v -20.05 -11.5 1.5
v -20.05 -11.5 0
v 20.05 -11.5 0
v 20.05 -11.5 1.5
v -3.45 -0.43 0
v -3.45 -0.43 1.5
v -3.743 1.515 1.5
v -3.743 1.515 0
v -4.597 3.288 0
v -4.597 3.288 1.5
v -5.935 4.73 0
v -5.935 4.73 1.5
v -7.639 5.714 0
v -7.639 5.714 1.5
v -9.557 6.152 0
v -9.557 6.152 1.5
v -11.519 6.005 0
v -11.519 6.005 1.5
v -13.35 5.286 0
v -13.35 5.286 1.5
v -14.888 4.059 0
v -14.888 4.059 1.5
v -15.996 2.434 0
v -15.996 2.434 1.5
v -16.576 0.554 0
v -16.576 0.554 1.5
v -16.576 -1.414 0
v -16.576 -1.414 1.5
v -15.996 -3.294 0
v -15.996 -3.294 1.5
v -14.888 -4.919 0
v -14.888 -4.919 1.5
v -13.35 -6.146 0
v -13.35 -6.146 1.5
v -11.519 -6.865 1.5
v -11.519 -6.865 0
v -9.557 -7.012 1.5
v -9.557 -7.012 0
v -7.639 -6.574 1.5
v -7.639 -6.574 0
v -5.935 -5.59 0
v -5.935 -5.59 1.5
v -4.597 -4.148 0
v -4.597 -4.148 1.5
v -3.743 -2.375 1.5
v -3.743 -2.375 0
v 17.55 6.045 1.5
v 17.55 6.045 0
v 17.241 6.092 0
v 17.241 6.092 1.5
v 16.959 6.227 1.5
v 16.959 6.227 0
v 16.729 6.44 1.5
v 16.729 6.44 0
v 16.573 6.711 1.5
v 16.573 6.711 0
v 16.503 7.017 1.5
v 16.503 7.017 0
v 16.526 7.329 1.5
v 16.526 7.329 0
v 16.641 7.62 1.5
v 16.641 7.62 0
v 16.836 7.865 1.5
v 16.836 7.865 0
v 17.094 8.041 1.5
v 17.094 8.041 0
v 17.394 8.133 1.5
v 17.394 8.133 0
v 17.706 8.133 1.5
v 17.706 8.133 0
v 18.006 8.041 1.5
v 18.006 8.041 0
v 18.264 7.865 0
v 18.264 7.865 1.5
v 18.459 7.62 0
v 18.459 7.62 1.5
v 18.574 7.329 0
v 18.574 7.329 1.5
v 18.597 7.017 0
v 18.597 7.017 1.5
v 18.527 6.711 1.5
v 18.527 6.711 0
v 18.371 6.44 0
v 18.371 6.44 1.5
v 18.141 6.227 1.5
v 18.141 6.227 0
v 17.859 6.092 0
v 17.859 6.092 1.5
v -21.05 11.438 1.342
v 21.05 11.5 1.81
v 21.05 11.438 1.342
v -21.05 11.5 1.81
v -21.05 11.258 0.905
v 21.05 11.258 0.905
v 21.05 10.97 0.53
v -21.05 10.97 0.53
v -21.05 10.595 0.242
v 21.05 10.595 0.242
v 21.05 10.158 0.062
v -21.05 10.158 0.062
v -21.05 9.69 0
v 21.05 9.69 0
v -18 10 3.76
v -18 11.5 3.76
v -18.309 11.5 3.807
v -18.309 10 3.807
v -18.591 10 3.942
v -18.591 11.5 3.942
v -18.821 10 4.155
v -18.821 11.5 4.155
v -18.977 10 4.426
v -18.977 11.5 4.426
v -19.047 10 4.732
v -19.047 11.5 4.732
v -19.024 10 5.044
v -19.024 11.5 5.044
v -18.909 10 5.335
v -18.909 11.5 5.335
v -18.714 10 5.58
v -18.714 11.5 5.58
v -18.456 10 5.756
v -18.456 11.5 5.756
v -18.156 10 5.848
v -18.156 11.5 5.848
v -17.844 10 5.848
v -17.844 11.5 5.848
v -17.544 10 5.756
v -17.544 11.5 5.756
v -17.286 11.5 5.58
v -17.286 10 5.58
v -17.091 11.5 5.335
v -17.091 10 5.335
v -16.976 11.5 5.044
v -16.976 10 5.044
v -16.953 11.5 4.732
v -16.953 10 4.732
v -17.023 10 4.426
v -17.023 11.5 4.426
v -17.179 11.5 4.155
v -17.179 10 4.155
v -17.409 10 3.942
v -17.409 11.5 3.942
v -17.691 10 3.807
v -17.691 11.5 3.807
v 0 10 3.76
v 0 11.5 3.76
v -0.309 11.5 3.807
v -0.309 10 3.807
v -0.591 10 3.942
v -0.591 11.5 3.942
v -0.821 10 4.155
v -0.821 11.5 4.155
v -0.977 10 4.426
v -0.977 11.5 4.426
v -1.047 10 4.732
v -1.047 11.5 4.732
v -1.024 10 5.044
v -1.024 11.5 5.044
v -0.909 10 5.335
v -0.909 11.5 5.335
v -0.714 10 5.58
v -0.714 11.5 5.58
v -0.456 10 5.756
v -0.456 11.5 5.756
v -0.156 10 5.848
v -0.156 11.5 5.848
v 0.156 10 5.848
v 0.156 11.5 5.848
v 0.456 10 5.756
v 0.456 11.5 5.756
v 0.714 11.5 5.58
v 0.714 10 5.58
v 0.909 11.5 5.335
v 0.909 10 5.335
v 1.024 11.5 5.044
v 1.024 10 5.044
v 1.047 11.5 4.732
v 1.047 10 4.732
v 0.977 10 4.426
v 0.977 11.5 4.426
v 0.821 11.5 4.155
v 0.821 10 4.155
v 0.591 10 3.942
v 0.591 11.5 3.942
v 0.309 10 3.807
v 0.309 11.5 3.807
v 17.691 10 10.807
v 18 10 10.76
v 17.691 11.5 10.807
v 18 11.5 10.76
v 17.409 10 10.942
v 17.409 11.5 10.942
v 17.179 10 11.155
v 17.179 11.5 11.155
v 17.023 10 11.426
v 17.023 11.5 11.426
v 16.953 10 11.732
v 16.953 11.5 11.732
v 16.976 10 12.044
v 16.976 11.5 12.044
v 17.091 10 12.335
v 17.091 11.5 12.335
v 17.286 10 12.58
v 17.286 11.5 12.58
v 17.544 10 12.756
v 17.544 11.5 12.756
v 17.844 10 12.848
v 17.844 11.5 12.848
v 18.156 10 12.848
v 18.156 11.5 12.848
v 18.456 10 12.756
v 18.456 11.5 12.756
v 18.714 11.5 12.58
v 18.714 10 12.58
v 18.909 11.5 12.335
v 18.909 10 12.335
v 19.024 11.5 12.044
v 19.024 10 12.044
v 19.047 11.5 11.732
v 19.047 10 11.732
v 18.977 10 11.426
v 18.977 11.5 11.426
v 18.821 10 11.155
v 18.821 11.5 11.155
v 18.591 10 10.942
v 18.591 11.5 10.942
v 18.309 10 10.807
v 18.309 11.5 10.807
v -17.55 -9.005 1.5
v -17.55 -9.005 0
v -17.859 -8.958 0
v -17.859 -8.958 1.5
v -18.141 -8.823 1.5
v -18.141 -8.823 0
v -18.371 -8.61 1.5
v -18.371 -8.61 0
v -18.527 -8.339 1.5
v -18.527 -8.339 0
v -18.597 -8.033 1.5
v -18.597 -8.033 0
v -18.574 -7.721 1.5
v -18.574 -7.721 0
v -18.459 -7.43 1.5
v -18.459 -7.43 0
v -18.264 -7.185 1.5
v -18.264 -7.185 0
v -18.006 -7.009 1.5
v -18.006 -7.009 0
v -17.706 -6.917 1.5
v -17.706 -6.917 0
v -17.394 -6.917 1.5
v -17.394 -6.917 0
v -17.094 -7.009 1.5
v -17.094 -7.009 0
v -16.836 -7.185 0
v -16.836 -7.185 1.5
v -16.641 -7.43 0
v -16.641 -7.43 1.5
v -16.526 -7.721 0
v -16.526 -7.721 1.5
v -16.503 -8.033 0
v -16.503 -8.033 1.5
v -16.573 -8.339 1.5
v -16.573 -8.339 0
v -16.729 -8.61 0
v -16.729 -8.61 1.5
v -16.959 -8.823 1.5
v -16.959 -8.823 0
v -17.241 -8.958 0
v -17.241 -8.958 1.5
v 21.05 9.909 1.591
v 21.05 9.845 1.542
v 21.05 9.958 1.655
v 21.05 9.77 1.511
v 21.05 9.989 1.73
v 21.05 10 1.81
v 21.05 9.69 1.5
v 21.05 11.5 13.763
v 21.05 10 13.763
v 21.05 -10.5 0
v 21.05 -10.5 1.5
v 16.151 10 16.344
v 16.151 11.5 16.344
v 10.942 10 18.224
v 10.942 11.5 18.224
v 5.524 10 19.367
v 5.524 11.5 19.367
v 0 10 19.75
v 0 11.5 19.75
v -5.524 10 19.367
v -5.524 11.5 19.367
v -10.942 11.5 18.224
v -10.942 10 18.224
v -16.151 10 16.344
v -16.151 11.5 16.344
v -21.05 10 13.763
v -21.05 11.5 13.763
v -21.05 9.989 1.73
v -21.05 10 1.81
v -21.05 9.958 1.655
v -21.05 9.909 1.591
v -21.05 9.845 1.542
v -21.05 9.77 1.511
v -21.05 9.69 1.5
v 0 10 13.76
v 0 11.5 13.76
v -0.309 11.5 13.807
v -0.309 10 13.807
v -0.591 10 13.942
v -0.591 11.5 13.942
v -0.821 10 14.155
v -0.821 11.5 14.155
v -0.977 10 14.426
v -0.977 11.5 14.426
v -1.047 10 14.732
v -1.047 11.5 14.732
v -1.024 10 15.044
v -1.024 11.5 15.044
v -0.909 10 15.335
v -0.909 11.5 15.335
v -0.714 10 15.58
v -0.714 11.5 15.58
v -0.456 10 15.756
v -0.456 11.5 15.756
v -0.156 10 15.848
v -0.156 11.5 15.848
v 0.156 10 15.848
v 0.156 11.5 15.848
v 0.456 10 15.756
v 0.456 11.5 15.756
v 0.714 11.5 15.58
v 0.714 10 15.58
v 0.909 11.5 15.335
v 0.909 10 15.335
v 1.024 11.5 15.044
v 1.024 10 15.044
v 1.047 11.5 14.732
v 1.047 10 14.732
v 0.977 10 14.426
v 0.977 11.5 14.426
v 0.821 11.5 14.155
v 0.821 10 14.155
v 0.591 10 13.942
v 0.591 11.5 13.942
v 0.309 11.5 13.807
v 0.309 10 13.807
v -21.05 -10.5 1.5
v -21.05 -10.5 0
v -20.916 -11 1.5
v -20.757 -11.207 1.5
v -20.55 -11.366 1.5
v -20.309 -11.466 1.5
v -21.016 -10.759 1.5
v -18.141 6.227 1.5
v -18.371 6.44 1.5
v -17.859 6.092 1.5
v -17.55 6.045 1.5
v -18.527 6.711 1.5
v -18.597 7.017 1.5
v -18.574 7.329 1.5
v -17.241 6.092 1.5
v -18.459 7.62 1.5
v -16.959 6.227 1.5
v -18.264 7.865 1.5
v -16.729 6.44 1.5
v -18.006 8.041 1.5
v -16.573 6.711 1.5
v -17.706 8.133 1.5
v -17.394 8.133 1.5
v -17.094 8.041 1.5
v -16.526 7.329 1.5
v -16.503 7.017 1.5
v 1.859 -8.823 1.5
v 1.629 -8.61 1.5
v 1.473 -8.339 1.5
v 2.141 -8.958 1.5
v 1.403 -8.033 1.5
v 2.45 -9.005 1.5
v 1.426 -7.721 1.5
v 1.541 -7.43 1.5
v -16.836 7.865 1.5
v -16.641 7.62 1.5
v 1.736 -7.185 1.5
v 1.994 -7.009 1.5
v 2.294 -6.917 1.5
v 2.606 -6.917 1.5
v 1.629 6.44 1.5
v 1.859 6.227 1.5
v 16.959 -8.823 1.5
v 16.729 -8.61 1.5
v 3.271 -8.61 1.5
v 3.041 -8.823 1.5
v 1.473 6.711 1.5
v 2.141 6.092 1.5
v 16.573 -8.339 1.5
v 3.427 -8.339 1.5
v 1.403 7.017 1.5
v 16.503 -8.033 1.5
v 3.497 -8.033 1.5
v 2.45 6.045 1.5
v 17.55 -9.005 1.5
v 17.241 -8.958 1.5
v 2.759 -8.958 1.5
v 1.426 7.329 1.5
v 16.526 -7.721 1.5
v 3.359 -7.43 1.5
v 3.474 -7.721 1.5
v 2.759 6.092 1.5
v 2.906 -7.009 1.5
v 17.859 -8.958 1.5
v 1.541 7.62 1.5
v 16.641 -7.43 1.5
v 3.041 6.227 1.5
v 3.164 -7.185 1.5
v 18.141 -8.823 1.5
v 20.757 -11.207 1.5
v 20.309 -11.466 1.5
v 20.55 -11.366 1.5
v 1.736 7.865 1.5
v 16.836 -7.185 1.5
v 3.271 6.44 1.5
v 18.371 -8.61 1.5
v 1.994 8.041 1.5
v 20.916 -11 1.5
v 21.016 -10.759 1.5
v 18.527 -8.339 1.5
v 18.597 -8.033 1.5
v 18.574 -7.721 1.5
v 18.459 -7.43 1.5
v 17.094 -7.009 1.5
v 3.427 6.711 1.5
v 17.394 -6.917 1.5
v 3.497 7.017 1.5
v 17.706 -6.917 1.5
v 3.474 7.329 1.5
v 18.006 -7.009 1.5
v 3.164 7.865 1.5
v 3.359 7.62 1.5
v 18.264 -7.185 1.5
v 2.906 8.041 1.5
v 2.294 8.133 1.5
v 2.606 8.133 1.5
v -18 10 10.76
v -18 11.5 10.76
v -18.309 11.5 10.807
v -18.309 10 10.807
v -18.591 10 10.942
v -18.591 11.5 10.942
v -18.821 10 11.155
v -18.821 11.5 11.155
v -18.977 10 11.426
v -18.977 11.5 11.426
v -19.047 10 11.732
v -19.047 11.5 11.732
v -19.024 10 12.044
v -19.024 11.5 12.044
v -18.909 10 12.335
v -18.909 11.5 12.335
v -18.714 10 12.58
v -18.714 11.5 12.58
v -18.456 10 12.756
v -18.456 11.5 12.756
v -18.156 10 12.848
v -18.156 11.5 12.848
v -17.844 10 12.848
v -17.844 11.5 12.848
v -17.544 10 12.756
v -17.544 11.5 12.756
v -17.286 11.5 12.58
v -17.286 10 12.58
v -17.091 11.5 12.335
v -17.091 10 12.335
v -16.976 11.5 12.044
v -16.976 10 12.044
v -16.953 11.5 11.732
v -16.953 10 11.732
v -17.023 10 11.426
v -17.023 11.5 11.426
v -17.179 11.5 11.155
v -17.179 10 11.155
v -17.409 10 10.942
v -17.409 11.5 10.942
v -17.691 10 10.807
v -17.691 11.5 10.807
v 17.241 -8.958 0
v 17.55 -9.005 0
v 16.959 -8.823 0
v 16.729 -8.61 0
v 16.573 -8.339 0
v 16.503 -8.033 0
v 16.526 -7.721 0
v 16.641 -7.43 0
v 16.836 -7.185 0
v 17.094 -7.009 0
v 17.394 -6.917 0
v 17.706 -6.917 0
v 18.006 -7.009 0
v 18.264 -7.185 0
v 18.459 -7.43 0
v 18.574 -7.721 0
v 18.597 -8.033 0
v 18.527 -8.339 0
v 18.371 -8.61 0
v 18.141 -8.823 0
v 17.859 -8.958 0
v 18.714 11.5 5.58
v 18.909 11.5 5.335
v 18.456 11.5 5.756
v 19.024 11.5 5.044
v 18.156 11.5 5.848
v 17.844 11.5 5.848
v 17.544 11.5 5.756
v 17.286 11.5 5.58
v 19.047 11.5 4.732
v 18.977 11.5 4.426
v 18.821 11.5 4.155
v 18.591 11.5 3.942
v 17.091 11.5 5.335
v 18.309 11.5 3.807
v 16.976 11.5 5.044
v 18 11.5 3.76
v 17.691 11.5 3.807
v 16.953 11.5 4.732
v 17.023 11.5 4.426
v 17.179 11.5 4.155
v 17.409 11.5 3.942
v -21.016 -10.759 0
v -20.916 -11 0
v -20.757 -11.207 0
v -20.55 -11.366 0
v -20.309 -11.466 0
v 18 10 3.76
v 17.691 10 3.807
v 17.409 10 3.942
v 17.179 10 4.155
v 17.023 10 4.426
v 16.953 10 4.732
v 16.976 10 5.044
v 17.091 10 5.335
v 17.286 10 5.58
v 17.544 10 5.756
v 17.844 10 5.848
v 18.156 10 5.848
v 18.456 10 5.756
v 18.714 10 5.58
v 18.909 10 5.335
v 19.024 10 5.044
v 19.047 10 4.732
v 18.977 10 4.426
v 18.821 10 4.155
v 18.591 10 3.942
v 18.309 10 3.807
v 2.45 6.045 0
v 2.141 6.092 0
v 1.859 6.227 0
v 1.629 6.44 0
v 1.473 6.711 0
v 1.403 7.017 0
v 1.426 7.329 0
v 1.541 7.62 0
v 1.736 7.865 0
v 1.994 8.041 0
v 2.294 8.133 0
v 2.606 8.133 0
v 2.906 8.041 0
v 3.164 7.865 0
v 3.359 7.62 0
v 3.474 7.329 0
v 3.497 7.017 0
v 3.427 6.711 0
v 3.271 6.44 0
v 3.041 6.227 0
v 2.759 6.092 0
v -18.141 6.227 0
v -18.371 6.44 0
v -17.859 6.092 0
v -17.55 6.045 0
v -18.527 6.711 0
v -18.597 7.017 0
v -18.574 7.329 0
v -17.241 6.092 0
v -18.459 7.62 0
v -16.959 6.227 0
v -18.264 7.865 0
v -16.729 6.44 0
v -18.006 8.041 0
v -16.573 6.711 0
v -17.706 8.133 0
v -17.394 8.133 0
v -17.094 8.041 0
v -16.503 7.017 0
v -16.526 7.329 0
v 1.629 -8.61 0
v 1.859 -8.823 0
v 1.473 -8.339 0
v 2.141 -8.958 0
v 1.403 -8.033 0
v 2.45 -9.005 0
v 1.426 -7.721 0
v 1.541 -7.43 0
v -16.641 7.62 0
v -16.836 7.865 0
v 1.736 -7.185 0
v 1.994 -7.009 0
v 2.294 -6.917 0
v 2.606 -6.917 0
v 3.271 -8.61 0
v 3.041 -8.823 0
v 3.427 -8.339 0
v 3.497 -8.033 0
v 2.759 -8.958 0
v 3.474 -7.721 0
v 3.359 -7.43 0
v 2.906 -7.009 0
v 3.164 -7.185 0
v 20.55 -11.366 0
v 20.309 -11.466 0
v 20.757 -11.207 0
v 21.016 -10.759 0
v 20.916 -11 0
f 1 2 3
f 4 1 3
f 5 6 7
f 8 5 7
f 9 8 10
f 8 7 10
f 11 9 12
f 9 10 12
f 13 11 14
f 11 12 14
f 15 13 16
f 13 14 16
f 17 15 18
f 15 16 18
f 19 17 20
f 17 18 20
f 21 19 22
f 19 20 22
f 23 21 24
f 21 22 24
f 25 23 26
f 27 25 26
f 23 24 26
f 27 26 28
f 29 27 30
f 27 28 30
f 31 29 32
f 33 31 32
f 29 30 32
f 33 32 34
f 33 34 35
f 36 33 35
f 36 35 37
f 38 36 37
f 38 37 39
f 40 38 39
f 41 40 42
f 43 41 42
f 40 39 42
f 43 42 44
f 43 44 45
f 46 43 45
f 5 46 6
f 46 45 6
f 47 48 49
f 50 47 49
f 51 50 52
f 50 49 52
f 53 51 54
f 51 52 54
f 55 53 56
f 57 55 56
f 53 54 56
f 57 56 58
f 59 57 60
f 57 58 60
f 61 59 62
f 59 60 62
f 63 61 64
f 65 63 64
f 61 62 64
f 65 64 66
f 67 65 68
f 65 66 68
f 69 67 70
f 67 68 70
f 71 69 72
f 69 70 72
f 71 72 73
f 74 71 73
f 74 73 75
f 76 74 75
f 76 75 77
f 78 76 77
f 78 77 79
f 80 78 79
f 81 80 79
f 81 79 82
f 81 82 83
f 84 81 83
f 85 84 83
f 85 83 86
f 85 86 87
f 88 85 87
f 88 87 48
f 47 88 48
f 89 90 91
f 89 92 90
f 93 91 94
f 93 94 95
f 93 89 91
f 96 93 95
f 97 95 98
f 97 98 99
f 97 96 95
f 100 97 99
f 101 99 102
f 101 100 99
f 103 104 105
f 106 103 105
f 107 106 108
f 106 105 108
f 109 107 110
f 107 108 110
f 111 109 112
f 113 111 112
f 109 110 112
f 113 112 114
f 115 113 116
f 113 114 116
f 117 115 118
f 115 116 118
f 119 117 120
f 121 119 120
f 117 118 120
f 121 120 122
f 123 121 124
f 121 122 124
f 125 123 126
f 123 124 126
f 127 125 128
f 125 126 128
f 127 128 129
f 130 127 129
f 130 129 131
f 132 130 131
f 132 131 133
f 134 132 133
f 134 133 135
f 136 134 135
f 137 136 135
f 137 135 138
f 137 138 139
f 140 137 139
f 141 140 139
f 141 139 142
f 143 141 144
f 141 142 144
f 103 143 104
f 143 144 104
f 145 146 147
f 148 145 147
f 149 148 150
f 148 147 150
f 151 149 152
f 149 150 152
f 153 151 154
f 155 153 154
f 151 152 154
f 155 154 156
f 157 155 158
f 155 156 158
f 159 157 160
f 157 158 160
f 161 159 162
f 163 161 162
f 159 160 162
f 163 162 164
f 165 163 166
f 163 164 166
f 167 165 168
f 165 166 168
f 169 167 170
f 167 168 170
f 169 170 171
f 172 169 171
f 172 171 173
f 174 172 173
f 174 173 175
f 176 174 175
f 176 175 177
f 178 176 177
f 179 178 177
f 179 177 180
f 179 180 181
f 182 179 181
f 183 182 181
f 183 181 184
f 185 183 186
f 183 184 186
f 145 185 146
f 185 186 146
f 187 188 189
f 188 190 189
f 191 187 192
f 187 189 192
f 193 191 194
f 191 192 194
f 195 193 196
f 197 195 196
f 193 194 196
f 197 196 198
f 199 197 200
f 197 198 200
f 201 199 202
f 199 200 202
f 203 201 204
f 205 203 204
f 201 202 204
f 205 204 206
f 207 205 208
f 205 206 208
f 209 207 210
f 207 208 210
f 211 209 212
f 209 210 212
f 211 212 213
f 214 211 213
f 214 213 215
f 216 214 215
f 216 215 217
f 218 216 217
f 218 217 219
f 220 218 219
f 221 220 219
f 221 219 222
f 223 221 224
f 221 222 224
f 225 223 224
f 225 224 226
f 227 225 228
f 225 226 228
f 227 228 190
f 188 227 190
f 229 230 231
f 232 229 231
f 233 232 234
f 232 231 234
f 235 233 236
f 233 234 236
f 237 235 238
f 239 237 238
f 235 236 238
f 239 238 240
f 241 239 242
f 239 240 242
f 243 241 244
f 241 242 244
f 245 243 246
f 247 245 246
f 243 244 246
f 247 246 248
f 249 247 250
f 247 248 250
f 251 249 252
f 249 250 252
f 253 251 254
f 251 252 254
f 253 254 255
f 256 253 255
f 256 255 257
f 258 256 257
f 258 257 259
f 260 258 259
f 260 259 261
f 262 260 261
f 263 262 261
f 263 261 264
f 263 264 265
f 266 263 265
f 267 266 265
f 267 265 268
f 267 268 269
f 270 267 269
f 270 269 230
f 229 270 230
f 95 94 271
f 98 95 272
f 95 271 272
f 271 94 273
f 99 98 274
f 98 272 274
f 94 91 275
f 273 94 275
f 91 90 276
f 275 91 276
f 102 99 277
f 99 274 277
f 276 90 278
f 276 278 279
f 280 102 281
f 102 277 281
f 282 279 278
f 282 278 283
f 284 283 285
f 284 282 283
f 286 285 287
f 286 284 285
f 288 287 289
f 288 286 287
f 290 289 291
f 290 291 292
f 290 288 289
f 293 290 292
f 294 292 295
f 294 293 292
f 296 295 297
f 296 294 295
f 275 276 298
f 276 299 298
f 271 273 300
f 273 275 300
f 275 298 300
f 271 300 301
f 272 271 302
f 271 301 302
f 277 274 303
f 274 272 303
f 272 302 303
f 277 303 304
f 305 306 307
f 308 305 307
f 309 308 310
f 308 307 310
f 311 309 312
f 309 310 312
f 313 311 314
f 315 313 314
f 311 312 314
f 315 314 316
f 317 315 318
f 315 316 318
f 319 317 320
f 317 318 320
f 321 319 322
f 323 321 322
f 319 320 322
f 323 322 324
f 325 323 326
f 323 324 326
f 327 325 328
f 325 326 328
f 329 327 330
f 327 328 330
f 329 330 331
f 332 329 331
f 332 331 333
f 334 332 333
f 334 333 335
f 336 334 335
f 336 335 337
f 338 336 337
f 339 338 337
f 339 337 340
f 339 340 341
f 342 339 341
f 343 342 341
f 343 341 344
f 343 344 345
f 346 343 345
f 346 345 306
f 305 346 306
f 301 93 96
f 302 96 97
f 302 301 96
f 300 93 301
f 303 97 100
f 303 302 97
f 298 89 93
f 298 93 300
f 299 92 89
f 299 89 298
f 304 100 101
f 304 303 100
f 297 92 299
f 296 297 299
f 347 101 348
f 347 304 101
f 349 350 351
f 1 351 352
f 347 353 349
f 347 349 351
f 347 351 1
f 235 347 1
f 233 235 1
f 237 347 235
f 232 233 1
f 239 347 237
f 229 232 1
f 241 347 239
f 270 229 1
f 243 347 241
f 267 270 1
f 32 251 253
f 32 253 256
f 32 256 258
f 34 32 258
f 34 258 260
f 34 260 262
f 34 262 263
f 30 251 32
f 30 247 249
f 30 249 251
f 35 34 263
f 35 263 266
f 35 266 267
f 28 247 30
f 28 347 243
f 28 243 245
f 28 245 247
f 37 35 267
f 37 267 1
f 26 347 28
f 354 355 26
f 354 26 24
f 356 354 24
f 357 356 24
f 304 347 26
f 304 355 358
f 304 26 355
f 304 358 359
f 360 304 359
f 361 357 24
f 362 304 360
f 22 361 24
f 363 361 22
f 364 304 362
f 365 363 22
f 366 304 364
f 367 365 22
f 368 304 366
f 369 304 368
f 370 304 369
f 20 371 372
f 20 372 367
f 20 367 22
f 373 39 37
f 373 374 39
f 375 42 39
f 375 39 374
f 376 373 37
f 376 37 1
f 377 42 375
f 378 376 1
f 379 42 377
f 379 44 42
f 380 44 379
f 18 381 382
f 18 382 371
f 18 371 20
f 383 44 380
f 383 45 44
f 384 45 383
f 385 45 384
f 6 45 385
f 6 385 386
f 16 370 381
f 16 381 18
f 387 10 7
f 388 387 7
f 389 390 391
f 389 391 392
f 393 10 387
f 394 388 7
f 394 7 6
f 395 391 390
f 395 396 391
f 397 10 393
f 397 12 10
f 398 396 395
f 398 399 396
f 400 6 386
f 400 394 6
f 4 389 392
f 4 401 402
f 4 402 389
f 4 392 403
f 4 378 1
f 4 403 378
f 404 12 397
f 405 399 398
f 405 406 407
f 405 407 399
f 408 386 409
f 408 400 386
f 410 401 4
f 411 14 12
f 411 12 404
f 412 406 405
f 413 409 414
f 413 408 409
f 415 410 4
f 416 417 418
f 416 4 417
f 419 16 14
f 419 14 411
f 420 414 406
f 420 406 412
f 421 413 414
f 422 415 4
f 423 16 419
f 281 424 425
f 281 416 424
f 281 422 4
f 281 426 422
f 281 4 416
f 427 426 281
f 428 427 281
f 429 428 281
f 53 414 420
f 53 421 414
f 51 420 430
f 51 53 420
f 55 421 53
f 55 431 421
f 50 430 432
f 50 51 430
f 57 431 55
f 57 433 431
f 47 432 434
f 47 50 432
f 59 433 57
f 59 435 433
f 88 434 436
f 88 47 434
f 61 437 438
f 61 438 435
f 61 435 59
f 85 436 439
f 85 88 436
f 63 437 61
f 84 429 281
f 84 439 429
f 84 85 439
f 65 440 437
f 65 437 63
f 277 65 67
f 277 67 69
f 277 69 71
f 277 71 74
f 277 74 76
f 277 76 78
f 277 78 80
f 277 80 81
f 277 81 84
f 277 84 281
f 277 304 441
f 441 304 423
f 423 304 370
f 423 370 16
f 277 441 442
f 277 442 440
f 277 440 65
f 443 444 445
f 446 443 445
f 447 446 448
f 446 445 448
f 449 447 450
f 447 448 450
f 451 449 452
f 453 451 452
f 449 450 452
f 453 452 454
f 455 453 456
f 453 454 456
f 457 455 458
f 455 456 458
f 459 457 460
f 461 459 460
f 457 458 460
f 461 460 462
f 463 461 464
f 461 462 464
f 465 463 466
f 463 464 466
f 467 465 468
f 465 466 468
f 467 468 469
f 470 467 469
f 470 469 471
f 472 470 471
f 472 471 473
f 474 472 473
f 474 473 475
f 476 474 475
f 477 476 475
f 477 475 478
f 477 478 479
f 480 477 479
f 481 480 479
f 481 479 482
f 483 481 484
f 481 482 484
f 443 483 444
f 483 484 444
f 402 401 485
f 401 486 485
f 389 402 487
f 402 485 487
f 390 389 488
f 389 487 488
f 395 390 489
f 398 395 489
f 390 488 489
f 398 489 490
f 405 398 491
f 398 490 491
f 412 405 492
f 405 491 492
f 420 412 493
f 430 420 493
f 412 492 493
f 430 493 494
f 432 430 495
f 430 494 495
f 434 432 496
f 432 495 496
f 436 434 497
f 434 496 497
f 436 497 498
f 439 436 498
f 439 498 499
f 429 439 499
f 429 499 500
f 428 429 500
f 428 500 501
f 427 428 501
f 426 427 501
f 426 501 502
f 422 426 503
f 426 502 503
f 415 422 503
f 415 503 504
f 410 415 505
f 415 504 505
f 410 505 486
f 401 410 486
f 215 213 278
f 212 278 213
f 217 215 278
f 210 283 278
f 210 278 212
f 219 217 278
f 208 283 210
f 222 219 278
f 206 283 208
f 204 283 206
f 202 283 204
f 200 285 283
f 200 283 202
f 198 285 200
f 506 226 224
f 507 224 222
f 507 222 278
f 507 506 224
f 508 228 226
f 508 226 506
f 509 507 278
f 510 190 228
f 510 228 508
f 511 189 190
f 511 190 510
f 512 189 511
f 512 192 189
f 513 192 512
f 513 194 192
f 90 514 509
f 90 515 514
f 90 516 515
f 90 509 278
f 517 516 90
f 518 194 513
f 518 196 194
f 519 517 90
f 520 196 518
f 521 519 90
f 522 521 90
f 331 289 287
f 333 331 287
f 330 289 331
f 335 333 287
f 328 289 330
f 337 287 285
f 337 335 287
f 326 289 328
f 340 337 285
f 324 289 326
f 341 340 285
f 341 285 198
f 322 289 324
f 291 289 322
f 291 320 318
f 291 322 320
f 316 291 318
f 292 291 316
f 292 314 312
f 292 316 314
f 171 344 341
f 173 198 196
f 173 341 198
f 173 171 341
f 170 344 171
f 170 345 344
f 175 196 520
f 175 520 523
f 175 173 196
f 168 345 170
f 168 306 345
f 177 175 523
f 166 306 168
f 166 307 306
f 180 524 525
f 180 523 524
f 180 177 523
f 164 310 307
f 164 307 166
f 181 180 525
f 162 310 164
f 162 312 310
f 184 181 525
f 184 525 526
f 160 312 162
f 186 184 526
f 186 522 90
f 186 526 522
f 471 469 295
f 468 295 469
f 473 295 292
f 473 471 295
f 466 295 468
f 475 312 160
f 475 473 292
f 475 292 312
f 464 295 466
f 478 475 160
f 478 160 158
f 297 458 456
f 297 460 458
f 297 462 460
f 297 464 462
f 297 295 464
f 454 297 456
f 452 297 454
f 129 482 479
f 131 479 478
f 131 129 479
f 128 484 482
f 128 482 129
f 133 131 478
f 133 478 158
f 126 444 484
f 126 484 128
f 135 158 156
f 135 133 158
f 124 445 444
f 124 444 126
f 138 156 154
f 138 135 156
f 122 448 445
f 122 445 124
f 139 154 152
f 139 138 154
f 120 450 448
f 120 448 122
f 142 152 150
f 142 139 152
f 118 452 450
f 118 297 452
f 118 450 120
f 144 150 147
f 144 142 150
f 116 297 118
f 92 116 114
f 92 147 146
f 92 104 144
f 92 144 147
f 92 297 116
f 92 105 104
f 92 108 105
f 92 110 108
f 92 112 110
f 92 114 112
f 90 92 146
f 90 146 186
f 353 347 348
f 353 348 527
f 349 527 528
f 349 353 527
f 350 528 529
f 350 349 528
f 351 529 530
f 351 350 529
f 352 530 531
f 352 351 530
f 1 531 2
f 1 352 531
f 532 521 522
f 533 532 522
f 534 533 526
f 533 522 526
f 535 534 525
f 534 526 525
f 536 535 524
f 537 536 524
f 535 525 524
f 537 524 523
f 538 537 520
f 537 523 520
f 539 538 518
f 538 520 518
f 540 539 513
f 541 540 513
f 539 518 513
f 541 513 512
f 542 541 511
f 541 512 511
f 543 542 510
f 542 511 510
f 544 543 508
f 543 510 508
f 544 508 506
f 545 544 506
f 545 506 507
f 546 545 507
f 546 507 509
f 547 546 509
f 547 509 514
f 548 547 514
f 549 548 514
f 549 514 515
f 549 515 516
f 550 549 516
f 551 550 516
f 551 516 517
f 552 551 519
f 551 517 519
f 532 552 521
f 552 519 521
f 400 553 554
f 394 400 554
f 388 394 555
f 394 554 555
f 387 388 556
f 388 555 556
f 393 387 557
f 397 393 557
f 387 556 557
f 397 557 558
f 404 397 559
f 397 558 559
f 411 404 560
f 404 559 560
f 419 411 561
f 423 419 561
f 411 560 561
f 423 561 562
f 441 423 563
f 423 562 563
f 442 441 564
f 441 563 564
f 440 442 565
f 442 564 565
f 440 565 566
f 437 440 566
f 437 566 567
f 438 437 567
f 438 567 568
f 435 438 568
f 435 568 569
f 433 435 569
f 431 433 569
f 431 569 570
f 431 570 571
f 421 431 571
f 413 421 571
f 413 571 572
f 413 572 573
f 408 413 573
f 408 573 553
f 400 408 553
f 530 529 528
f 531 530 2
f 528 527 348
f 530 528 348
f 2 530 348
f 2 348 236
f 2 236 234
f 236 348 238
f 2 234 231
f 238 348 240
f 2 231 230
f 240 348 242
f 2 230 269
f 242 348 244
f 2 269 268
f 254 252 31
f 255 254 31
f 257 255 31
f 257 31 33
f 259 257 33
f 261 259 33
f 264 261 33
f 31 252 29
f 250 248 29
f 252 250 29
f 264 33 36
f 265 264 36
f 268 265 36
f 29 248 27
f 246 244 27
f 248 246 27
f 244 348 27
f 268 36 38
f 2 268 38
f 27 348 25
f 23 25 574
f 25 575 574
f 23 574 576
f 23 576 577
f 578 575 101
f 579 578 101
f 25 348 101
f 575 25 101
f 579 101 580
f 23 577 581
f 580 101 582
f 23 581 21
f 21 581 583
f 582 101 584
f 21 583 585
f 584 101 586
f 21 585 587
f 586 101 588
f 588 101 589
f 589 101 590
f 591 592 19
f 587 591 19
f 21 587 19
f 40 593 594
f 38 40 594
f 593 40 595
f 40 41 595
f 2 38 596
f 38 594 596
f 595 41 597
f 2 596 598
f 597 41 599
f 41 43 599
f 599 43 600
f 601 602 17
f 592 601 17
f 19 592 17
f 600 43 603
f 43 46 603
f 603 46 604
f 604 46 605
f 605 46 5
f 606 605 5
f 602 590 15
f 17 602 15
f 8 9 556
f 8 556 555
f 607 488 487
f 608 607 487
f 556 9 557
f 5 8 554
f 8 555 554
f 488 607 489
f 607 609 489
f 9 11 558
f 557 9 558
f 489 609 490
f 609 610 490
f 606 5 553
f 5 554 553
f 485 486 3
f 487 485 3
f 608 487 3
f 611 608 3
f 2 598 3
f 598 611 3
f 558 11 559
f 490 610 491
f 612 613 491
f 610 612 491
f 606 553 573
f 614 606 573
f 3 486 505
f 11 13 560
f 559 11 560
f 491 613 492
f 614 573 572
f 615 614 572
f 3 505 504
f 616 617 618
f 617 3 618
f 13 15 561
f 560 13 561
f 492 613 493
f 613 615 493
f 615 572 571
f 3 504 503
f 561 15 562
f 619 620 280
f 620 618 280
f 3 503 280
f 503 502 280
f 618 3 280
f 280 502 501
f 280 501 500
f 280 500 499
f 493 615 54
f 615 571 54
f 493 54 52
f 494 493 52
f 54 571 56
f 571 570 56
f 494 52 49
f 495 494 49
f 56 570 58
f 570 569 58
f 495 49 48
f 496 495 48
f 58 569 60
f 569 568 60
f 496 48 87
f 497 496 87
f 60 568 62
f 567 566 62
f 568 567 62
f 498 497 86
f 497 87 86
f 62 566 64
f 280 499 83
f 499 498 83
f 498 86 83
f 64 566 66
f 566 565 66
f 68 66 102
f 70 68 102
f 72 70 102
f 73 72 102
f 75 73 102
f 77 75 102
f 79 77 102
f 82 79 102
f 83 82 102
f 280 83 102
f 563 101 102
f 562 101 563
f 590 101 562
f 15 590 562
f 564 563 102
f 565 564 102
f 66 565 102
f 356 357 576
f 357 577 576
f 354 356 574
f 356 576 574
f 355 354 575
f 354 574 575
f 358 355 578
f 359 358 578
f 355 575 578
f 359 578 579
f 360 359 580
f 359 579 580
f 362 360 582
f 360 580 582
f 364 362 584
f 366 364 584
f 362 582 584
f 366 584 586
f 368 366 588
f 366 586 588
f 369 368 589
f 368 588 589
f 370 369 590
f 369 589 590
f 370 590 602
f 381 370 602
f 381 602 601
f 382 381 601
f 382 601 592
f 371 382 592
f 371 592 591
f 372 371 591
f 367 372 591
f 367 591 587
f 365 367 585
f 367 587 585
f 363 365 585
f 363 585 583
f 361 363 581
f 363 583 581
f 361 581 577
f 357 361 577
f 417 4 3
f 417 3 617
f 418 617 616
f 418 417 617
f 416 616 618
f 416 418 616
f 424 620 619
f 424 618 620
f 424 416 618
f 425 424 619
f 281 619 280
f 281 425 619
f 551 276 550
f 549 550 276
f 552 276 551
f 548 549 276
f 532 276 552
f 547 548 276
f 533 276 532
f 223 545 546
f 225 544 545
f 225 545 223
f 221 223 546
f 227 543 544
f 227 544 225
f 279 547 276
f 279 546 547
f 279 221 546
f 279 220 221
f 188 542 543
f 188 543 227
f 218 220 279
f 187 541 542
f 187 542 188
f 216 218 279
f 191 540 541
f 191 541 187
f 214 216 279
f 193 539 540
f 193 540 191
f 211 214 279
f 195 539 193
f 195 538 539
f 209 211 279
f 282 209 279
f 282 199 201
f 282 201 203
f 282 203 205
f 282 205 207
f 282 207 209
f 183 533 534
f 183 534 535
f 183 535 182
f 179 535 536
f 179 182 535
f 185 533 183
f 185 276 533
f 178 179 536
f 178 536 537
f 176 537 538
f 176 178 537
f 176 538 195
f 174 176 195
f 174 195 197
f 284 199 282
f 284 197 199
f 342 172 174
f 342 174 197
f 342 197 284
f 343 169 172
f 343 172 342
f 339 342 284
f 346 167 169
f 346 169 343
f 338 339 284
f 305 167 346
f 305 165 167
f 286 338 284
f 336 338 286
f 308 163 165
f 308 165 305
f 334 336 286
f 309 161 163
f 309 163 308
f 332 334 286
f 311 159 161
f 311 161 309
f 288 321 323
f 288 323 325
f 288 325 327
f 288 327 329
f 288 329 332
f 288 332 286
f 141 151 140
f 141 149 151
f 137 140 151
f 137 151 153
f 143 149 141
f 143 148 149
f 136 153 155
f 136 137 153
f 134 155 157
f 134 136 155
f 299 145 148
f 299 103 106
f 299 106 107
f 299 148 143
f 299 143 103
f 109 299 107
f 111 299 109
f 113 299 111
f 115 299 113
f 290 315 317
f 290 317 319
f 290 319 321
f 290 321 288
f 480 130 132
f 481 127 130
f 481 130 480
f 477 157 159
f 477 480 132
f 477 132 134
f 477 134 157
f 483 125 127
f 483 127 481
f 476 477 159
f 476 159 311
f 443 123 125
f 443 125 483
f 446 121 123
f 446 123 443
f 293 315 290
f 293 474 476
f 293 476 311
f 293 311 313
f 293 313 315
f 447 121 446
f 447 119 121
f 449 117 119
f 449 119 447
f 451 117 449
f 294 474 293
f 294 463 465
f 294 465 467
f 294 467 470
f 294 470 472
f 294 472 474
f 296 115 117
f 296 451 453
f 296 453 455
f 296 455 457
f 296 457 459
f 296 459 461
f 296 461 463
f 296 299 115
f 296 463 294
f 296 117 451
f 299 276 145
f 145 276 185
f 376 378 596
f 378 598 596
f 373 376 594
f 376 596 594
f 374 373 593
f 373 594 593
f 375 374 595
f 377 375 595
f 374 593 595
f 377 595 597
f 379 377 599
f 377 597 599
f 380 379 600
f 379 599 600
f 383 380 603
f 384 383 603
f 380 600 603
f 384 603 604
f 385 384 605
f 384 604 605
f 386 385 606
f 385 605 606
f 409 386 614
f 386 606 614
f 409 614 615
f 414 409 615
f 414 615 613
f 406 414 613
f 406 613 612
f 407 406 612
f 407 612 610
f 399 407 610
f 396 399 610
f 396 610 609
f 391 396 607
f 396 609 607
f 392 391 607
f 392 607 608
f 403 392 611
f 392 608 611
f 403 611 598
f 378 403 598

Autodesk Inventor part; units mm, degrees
ref_plane "YZ Plane" through (0, 0, 0) normal (1, 0, 0) x (0, 1, 0)
ref_plane "XZ Plane" through (0, 0, 0) normal (0, 1, 0) x (-1, 0, 0)
ref_plane "XY Plane" through (0, 0, 0) normal (0, 0, 1) x (1, 0, 0)
sketch "Sketch1" plane through (0, 0, 0) normal (0, 0, 1) x (1, 0, 0)
  line L0 (-21.05, -11.5) -> (21.05, -11.5)
  line L1 (21.05, -11.5) -> (21.05, 11.5)
  line L2 (21.05, 11.5) -> (-21.05, 11.5)
  line L3 (-21.05, 11.5) -> (-21.05, -11.5)
  line L4 (-21.05, -11.5) -> (21.05, 11.5) construction
  line L5 (21.05, -11.5) -> (-21.05, 11.5) construction
  point P0 (0, 0)
  dimension "d0" = 42.1
  dimension "d1" = 23
extrude "Plate1" add sketch "Sketch1" along normal blind 1.5
sketch "Sketch2" plane through (0, 0, 1.5) normal (0, 0, 1) x (1, 0, 0)
  circle A0 centre (17.55, 7.095) radius 0.7835 projected
  circle A1 centre (17.55, -7.955) radius 0.7835 projected
  circle A2 centre (2.45, 7.095) radius 0.7835 projected
  circle A3 centre (2.45, -7.955) radius 0.7835 projected
  circle A4 centre (-17.55, 7.095) radius 0.7835 projected
  circle A5 centre (-17.55, -7.955) radius 0.7835 projected
  point P0 (0, 0)
hole "Hole1" at (17.55, -7.955, 1.5) at (2.45, -7.955, 1.5) at (-17.55, -7.955, 1.5) at (-17.55, 7.095, 1.5) at (2.45, 7.095, 1.5) at (17.55, 7.095, 1.5) direction (0, 0, -1) diameter 2.1 end through all
sketch "Sketch3" plane through (0, 0, 1.5) normal (0, 0, 1) x (1, 0, 0)
  circle A0 centre (-10.05, -0.43) radius 6.4 projected
  circle A1 centre (-10.05, -0.43) radius 6.6
  point P0 (0, 0)
  dimension "d10" = 0.2
extrude "Extrusion1" cut sketch "Sketch3" against normal through all contours A0 | A1
sketch "Sketch4" plane through (-21.05, 10, 0) normal (0, 1, 0) x (-1, 0, 0)
  line L0 (-42.1, 0) -> (0, 0)
  line L1 (0, 0) -> (0, 25)
  line L2 (0, 25) -> (-42.1, 25)
  line L3 (-42.1, 25) -> (-42.1, 0)
edge flange "Flange1" height 25 angle 90 thickness 1.5 bend radius 0.31 thickness toward (0, 1, 0) relief tear relief width 1.5 relief depth 0.75 edges at (0, 11.5, 1.5) wall of the first edge with corners at (21.05, 10, 0) (-21.05, 10, 0) (-21.05, 10, 25) (21.05, 10, 25)
bend "Bend1"
corner "Corner1"
sketch "Sketch5" plane through (-21.05, 10, 25) normal (0, -1, 0) x (1, 0, 0)
  circle A0 centre (21.05, -45.25) radius 40 projected
  circle A1 centre (21.05, -45.25) radius 53
  point P0 (21.05, -25)
  dimension "d23" = 13
extrude "Cut1" cut sketch "Sketch5" against normal blind 1.5
fillet "Corner Round1" radius 1 2 edges at (21.05, -11.5, 0.75) (-21.05, -11.5, 0.75)
sketch "Sketch6" plane through (-21.05, 10, 1.81) normal (0, -1, 0) x (1, 0, 0)
  line L0 (0, 0) -> (42.1, 0) projected
  arc A0 (42.1, 11.9532) -> (0, 11.9532) centre (21.05, -22.06) ccw projected
  line L1 (21.05, 0) -> (21.05, 17.94) construction
  point P0 (21.05, -1.81)
  point P1 (3.05, 3)
  point P2 (3.05, 10)
  point P3 (21.05, 13)
  point P4 (21.05, 3)
  point P5 (39.05, 3)
  point P6 (39.05, 10)
  dimension "d27" = 10
  dimension "d28" = 3
  dimension "d29" = 18
  dimension "d30" = 7
hole "Hole2" at (-18, 10, 4.81) at (-18, 10, 11.81) at (0, 10, 14.81) at (0, 10, 4.81) at (18, 10, 4.81) at (18, 10, 11.81) direction (0, 1, 0) diameter 2.1 end through all
equation "\"d8\" = Thickness"
equation "\"d24\" = Thickness"
equation "\"d2\" = Thickness"
equation "\"d13\" = BendReliefWidth"
equation "\"d14\" = BendReliefDepth"
equation "\"d15\" = MinimumRemnant"
equation "\"d16\" = TransitionRadius"
equation "\"d19\" = BendRadius"
equation "\"d20\" = CornerReliefSize"
equation "\"d21\" = GapSize"
equation "\"d22\" = JacobiRadiusSize"
equation "\"BendReliefWidth\" = Thickness"
equation "\"BendReliefDepth\" = 0.5 * Thickness"
equation "\"CornerReliefSize\" = 4 * Thickness"
equation "\"MinimumRemnant\" = 2 * Thickness"
equation "\"TransitionRadius\" = BendRadius"
equation "\"JacobiRadiusSize\" = BendRadius"
equation "\"GapSize\" = Thickness"
equation "\"Thickness\" = 1.5"
equation "\"BendRadius\" = 0.31"
properties part number "axis_2_bottom_L_frame(bottom)" material "Aluminum 6061-AHC"
